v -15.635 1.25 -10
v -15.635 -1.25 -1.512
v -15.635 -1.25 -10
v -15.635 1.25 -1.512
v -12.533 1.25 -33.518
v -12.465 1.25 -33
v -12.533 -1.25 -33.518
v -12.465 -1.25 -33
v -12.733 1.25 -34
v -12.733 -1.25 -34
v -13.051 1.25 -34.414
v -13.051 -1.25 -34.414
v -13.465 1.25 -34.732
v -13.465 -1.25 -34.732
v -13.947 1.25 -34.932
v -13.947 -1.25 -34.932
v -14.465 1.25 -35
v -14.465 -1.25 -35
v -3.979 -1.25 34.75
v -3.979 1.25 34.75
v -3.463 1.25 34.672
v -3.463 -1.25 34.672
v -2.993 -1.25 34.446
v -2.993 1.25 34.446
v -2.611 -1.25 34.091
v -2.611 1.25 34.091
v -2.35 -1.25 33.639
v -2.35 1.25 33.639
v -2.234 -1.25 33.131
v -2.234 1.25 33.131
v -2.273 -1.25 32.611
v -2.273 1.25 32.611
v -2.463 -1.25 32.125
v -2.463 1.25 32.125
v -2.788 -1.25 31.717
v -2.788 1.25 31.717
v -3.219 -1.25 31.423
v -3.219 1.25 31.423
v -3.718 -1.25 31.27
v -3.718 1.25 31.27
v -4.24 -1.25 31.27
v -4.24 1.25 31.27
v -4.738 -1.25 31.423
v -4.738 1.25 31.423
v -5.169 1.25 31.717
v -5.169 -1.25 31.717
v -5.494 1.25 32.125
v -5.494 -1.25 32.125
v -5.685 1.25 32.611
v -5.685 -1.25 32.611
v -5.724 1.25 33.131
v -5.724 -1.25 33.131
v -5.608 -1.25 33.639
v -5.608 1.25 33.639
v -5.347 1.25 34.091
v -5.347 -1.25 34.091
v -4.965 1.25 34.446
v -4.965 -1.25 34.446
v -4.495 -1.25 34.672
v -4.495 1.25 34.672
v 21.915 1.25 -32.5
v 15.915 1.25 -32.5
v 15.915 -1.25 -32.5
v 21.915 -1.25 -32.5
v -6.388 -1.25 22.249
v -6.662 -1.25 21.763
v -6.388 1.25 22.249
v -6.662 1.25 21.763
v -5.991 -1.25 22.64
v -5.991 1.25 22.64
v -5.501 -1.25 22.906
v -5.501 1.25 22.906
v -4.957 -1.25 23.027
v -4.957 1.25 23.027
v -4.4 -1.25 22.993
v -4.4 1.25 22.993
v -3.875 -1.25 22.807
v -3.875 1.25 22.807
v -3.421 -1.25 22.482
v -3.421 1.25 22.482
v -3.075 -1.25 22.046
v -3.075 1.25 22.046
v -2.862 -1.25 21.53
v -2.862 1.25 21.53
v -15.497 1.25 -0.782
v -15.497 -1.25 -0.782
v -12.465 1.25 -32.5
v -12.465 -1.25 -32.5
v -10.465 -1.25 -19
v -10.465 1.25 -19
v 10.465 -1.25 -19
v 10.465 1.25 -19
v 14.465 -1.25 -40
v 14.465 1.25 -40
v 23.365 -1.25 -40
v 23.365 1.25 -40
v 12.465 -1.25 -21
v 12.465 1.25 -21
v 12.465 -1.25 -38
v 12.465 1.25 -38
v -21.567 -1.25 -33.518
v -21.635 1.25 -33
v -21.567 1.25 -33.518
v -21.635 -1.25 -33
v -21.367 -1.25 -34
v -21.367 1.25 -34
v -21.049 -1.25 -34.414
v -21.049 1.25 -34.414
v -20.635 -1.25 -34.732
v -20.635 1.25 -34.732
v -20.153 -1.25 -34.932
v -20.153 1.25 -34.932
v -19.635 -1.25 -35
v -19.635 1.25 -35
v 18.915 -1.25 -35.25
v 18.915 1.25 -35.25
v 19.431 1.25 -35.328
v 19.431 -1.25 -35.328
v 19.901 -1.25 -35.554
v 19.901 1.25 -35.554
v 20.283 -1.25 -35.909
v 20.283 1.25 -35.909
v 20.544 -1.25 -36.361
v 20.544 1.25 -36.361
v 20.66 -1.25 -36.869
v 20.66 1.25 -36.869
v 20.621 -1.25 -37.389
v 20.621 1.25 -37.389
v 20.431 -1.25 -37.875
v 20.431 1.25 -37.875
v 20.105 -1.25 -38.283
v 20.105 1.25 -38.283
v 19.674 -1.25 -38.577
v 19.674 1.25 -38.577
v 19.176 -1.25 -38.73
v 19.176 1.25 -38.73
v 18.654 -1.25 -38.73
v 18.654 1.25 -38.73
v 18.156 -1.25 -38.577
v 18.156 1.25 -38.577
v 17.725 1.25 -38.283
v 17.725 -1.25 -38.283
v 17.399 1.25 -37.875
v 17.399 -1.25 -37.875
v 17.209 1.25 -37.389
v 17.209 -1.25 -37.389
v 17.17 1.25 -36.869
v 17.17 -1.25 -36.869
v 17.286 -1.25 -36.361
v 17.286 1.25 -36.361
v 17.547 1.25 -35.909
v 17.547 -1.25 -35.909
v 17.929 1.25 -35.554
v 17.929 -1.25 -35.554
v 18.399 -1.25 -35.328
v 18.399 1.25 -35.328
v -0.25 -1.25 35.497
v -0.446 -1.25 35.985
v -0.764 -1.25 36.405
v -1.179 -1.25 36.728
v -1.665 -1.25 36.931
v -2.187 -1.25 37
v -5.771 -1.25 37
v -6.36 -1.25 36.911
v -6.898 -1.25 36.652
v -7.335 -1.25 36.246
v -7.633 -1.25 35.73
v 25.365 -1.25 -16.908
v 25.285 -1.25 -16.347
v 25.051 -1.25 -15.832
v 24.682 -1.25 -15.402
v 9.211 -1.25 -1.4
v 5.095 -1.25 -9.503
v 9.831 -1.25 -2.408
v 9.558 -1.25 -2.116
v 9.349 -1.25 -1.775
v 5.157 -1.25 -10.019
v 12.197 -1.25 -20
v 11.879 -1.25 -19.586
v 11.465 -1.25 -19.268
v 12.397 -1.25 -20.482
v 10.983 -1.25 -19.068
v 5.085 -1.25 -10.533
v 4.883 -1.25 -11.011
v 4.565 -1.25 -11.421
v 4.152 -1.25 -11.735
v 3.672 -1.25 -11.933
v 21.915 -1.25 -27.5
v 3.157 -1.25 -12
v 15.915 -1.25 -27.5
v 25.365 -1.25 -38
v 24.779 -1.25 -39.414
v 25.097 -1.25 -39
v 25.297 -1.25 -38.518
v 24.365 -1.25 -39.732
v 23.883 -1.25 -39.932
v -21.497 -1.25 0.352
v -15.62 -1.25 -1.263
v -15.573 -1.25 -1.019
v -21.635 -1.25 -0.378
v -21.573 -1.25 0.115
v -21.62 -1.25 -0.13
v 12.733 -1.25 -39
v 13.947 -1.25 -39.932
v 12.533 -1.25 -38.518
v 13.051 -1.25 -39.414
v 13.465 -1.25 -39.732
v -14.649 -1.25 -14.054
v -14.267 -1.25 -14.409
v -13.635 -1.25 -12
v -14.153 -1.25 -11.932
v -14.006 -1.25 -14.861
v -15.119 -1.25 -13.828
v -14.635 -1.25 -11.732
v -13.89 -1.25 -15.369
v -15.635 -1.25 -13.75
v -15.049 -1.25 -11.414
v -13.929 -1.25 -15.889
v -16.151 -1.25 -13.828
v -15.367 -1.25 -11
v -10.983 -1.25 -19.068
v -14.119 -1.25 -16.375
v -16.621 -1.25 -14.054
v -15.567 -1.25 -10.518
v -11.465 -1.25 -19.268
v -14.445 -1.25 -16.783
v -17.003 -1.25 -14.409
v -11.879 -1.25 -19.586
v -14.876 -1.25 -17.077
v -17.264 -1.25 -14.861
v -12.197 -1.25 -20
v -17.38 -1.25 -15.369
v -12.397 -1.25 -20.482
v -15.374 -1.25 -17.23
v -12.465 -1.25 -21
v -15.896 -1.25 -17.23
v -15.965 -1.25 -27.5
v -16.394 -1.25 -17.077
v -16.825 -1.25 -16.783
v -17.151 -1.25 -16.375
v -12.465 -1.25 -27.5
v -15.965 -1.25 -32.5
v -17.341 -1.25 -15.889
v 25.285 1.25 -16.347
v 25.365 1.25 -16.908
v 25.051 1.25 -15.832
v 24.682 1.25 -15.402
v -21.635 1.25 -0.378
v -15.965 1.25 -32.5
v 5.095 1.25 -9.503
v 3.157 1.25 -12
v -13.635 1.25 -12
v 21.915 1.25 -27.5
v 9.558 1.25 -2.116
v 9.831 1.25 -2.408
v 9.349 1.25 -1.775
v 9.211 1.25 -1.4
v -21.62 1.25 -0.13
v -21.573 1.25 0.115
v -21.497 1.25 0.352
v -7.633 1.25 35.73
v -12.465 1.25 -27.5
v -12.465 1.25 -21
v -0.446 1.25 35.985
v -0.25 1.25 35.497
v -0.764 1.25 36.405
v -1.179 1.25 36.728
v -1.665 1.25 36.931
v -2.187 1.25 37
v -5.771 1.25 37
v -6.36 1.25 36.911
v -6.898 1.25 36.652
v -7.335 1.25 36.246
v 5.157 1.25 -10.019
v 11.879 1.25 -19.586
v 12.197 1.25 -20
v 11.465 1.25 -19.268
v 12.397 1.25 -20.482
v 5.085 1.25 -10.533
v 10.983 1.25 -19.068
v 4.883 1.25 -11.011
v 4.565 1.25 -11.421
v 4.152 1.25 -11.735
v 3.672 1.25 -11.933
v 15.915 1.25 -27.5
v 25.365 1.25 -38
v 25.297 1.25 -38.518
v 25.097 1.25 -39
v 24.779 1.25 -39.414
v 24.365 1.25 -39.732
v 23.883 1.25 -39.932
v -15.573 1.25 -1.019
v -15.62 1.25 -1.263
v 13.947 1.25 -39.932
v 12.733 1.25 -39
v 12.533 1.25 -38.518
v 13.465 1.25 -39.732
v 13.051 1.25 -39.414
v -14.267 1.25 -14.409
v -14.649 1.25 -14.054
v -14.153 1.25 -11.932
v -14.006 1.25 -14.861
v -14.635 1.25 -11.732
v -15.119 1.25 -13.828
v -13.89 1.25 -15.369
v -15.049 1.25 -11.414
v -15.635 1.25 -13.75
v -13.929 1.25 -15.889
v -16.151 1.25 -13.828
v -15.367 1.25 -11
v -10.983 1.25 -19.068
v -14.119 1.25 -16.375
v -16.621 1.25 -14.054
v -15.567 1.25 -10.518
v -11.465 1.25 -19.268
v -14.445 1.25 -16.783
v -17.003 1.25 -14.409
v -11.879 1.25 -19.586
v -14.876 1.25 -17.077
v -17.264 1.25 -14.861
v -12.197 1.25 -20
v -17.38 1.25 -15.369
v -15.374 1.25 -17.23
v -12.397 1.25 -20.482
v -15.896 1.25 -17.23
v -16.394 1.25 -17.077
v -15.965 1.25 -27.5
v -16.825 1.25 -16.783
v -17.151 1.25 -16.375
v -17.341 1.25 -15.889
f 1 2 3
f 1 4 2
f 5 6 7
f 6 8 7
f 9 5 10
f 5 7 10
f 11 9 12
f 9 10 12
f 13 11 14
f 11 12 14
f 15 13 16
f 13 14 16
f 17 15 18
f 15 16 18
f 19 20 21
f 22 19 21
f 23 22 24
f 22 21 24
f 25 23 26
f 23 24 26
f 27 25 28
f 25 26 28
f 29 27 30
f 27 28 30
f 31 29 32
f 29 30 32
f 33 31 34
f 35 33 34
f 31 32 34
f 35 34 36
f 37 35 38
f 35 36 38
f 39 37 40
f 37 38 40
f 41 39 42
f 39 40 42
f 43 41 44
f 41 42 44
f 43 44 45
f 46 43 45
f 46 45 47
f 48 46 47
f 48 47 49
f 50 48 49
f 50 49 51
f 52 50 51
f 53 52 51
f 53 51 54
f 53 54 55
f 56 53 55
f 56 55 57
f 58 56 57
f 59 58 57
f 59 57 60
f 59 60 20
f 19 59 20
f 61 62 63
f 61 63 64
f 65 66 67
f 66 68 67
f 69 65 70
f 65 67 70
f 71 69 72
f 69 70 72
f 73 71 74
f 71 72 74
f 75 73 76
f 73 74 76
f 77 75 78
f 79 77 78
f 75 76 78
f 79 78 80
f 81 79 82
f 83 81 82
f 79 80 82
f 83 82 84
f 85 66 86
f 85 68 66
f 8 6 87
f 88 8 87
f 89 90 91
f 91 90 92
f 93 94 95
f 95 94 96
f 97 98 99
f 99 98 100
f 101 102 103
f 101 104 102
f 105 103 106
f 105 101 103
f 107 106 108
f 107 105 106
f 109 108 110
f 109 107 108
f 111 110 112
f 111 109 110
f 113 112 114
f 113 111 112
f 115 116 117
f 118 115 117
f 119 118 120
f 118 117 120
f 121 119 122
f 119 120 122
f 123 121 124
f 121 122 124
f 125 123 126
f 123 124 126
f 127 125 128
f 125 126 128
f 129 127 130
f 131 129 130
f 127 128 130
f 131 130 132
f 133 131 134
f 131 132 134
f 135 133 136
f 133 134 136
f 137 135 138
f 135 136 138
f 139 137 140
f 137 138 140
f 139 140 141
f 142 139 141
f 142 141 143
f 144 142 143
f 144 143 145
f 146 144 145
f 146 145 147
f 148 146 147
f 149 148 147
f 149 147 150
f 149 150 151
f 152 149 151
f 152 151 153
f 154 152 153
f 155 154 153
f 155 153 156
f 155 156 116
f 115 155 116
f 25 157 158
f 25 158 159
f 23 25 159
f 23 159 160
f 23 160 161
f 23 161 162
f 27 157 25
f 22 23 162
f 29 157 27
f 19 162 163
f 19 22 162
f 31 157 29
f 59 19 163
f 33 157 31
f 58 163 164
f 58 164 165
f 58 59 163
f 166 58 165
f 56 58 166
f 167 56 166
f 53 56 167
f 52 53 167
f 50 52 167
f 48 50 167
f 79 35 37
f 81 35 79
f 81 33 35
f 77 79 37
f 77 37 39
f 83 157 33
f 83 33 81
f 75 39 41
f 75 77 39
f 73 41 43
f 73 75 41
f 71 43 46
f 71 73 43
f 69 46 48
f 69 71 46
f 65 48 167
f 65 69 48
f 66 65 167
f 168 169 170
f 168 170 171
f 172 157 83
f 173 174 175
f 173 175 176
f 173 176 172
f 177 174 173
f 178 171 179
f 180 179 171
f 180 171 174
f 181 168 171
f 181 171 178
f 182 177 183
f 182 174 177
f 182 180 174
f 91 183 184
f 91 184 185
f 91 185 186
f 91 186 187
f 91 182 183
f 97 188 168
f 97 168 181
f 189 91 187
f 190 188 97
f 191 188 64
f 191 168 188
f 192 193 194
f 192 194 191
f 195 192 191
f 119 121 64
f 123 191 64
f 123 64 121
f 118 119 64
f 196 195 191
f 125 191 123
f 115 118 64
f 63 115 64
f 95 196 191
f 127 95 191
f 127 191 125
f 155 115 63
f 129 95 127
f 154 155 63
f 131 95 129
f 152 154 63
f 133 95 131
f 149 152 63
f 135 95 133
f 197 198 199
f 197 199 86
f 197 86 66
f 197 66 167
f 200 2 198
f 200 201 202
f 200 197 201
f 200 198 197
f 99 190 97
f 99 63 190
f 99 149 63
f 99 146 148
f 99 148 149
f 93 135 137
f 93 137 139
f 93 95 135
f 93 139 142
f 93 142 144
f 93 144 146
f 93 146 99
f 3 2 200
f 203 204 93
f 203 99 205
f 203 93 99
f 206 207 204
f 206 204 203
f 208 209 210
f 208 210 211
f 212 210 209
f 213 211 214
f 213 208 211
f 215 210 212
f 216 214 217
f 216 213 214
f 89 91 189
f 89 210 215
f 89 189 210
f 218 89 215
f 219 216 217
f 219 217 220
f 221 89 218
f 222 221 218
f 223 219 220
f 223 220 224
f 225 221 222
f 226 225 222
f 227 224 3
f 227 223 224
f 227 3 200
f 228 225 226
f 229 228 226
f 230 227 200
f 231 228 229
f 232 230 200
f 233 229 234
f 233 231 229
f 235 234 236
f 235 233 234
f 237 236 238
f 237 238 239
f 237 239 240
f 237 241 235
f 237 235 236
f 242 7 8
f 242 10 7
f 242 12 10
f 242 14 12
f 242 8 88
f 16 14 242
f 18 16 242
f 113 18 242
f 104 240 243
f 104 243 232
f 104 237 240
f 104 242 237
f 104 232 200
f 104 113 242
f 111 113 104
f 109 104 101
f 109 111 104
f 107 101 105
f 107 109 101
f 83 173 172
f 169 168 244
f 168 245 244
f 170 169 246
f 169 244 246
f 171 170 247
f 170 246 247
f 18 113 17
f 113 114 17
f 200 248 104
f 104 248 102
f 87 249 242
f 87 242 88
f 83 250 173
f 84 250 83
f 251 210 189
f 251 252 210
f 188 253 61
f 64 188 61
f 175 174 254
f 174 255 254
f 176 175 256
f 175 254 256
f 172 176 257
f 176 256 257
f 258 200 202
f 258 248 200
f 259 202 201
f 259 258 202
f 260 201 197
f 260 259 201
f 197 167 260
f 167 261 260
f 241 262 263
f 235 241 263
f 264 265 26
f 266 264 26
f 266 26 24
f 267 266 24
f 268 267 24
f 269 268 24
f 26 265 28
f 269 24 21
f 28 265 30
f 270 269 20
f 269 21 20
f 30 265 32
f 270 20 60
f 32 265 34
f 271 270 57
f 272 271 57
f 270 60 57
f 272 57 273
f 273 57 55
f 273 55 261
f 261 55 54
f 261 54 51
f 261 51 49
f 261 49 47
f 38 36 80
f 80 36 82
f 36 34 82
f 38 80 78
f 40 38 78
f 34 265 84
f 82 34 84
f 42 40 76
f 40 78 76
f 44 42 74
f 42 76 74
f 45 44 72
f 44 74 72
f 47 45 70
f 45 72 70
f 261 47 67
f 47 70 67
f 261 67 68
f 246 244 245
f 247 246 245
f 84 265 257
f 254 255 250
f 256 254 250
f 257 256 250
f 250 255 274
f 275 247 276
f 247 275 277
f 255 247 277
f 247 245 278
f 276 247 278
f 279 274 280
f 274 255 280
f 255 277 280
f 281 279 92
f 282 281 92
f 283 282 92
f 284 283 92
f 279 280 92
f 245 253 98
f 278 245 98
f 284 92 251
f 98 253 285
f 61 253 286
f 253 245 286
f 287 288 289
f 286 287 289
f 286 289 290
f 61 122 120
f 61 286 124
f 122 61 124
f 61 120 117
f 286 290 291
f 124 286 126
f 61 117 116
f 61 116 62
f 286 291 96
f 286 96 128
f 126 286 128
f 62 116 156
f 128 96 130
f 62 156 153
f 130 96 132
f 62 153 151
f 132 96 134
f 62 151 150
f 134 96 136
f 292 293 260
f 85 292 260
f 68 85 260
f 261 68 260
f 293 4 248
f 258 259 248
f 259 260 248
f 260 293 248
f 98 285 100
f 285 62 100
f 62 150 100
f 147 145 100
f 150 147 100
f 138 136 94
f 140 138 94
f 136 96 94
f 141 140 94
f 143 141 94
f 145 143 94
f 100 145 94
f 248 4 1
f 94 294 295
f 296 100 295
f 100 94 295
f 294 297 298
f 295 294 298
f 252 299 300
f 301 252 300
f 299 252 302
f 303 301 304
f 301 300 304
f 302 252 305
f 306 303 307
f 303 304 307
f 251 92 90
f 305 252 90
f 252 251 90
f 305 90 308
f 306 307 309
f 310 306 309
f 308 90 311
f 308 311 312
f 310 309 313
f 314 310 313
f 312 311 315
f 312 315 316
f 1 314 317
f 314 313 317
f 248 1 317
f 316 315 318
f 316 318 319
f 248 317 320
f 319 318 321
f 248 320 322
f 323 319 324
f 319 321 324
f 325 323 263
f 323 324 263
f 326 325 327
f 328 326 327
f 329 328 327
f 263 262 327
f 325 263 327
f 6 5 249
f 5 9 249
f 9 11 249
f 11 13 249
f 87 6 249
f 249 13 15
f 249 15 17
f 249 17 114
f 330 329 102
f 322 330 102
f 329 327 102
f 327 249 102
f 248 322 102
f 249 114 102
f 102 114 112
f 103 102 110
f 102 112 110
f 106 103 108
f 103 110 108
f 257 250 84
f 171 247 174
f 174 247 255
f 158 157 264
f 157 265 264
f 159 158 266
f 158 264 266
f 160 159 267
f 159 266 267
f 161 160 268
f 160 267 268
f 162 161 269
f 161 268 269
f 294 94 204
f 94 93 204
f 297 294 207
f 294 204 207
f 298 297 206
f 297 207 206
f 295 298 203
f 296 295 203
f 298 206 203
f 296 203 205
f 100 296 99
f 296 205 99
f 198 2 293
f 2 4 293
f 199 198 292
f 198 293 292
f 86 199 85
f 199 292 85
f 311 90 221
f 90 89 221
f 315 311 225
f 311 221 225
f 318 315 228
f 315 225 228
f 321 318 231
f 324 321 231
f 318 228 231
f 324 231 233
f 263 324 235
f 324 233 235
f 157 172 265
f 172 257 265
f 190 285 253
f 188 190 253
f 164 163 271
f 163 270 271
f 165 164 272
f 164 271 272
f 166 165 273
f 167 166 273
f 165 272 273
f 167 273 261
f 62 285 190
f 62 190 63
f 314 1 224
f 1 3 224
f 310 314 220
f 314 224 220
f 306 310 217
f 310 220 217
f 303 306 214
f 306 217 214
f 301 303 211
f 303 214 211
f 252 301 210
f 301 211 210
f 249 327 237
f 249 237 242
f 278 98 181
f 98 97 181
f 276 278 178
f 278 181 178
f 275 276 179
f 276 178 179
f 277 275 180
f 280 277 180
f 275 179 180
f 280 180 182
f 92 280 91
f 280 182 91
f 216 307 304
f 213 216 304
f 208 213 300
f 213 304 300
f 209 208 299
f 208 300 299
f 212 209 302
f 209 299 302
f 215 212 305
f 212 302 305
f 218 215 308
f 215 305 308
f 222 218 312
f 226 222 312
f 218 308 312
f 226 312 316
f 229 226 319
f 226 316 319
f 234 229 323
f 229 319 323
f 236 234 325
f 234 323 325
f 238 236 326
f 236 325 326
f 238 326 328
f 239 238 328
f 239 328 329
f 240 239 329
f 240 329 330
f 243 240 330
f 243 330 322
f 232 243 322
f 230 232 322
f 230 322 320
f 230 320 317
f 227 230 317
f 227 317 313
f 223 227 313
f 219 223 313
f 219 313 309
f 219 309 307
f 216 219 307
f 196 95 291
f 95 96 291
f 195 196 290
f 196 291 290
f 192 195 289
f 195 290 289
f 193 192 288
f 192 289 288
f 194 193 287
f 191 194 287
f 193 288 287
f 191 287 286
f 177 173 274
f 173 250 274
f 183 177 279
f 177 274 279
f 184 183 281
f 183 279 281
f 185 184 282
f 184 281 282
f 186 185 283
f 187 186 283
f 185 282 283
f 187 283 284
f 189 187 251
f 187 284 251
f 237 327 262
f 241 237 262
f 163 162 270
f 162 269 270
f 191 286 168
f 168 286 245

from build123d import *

# Parameters (mm, degrees)
BOSS_EXTRUDE1_DEPTH = 1.25
FILLET2_R           = 2
SKETCH2_R           = 1.75
SKETCH2_W           = 6
SKETCH2_H           = 5
SKETCH2_W_2         = 3.5
CUT_EXTRUDE1_DEPTH  = 48.430298597


with BuildPart() as part:
    # Sketch1 → Boss-Extrude1 (new, symmetric)
    with BuildSketch(Plane(origin=(0, 0, 0), x_dir=(1, 0, 0), z_dir=(0, 1, 0))):
        Polygon((-21.635, 0), (-21.635, 35), (-12.465, 35), (-12.465, 19), (12.465, 19), (12.465, 40), (25.365, 40), (25.365, 16), (9.365, 2), (-0.635, -37), (-7.135, -37), align=None)
        Polygon((-15.635, 12), (5.735003444, 12), (-4.401302874, -27.531594642), (-15.635, 1.133701473), align=None, mode=Mode.SUBTRACT)
    extrude(amount=BOSS_EXTRUDE1_DEPTH, both=True)

    # Fillet2
    fillet2_edges = [part.edges().sort_by_distance(p)[0] for p in [
        (-21.635, 0, 0),
        (-21.635, 0, -35),
        (-12.465, 0, -35),
        (-12.465, 0, -19),
        (12.465, 0, -19),
        (12.465, 0, -40),
        (25.365, 0, -40),
        (25.365, 0, -16),
        (9.365, 0, -2),
        (-0.635, 0, 37),
        (-7.135, 0, 37),
        (-15.635, 0, -12),
        (-15.635, 0, -1.133701473),
        (-4.401302874, 0, 27.531594642),
        (5.735003444, 0, -12),
    ]]
    fillet(fillet2_edges, radius=FILLET2_R)

    # Sketch2 → Cut-Extrude1 (cut, through all)
    with BuildSketch(Plane(origin=(0, 1.25, 0), x_dir=(1, 0, 0), z_dir=(0, 1, 0))):
        with Locations(Location((18.915, 37, 0), (0, 0, 270))):
            Circle(SKETCH2_R)
        with Locations(Location((-15.635, 15.5, 0), (0, 0, 270))):
            Circle(SKETCH2_R)
        with Locations(Location((-3.97878342, -33, 0), (0, 0, 270))):
            Circle(SKETCH2_R)
        with Locations((18.915, 30)):
            Rectangle(SKETCH2_W, SKETCH2_H)
        with Locations((-14.215, 30)):
            Rectangle(SKETCH2_W_2, SKETCH2_H)
    extrude(amount=-CUT_EXTRUDE1_DEPTH, mode=Mode.SUBTRACT)


solid = part.part
